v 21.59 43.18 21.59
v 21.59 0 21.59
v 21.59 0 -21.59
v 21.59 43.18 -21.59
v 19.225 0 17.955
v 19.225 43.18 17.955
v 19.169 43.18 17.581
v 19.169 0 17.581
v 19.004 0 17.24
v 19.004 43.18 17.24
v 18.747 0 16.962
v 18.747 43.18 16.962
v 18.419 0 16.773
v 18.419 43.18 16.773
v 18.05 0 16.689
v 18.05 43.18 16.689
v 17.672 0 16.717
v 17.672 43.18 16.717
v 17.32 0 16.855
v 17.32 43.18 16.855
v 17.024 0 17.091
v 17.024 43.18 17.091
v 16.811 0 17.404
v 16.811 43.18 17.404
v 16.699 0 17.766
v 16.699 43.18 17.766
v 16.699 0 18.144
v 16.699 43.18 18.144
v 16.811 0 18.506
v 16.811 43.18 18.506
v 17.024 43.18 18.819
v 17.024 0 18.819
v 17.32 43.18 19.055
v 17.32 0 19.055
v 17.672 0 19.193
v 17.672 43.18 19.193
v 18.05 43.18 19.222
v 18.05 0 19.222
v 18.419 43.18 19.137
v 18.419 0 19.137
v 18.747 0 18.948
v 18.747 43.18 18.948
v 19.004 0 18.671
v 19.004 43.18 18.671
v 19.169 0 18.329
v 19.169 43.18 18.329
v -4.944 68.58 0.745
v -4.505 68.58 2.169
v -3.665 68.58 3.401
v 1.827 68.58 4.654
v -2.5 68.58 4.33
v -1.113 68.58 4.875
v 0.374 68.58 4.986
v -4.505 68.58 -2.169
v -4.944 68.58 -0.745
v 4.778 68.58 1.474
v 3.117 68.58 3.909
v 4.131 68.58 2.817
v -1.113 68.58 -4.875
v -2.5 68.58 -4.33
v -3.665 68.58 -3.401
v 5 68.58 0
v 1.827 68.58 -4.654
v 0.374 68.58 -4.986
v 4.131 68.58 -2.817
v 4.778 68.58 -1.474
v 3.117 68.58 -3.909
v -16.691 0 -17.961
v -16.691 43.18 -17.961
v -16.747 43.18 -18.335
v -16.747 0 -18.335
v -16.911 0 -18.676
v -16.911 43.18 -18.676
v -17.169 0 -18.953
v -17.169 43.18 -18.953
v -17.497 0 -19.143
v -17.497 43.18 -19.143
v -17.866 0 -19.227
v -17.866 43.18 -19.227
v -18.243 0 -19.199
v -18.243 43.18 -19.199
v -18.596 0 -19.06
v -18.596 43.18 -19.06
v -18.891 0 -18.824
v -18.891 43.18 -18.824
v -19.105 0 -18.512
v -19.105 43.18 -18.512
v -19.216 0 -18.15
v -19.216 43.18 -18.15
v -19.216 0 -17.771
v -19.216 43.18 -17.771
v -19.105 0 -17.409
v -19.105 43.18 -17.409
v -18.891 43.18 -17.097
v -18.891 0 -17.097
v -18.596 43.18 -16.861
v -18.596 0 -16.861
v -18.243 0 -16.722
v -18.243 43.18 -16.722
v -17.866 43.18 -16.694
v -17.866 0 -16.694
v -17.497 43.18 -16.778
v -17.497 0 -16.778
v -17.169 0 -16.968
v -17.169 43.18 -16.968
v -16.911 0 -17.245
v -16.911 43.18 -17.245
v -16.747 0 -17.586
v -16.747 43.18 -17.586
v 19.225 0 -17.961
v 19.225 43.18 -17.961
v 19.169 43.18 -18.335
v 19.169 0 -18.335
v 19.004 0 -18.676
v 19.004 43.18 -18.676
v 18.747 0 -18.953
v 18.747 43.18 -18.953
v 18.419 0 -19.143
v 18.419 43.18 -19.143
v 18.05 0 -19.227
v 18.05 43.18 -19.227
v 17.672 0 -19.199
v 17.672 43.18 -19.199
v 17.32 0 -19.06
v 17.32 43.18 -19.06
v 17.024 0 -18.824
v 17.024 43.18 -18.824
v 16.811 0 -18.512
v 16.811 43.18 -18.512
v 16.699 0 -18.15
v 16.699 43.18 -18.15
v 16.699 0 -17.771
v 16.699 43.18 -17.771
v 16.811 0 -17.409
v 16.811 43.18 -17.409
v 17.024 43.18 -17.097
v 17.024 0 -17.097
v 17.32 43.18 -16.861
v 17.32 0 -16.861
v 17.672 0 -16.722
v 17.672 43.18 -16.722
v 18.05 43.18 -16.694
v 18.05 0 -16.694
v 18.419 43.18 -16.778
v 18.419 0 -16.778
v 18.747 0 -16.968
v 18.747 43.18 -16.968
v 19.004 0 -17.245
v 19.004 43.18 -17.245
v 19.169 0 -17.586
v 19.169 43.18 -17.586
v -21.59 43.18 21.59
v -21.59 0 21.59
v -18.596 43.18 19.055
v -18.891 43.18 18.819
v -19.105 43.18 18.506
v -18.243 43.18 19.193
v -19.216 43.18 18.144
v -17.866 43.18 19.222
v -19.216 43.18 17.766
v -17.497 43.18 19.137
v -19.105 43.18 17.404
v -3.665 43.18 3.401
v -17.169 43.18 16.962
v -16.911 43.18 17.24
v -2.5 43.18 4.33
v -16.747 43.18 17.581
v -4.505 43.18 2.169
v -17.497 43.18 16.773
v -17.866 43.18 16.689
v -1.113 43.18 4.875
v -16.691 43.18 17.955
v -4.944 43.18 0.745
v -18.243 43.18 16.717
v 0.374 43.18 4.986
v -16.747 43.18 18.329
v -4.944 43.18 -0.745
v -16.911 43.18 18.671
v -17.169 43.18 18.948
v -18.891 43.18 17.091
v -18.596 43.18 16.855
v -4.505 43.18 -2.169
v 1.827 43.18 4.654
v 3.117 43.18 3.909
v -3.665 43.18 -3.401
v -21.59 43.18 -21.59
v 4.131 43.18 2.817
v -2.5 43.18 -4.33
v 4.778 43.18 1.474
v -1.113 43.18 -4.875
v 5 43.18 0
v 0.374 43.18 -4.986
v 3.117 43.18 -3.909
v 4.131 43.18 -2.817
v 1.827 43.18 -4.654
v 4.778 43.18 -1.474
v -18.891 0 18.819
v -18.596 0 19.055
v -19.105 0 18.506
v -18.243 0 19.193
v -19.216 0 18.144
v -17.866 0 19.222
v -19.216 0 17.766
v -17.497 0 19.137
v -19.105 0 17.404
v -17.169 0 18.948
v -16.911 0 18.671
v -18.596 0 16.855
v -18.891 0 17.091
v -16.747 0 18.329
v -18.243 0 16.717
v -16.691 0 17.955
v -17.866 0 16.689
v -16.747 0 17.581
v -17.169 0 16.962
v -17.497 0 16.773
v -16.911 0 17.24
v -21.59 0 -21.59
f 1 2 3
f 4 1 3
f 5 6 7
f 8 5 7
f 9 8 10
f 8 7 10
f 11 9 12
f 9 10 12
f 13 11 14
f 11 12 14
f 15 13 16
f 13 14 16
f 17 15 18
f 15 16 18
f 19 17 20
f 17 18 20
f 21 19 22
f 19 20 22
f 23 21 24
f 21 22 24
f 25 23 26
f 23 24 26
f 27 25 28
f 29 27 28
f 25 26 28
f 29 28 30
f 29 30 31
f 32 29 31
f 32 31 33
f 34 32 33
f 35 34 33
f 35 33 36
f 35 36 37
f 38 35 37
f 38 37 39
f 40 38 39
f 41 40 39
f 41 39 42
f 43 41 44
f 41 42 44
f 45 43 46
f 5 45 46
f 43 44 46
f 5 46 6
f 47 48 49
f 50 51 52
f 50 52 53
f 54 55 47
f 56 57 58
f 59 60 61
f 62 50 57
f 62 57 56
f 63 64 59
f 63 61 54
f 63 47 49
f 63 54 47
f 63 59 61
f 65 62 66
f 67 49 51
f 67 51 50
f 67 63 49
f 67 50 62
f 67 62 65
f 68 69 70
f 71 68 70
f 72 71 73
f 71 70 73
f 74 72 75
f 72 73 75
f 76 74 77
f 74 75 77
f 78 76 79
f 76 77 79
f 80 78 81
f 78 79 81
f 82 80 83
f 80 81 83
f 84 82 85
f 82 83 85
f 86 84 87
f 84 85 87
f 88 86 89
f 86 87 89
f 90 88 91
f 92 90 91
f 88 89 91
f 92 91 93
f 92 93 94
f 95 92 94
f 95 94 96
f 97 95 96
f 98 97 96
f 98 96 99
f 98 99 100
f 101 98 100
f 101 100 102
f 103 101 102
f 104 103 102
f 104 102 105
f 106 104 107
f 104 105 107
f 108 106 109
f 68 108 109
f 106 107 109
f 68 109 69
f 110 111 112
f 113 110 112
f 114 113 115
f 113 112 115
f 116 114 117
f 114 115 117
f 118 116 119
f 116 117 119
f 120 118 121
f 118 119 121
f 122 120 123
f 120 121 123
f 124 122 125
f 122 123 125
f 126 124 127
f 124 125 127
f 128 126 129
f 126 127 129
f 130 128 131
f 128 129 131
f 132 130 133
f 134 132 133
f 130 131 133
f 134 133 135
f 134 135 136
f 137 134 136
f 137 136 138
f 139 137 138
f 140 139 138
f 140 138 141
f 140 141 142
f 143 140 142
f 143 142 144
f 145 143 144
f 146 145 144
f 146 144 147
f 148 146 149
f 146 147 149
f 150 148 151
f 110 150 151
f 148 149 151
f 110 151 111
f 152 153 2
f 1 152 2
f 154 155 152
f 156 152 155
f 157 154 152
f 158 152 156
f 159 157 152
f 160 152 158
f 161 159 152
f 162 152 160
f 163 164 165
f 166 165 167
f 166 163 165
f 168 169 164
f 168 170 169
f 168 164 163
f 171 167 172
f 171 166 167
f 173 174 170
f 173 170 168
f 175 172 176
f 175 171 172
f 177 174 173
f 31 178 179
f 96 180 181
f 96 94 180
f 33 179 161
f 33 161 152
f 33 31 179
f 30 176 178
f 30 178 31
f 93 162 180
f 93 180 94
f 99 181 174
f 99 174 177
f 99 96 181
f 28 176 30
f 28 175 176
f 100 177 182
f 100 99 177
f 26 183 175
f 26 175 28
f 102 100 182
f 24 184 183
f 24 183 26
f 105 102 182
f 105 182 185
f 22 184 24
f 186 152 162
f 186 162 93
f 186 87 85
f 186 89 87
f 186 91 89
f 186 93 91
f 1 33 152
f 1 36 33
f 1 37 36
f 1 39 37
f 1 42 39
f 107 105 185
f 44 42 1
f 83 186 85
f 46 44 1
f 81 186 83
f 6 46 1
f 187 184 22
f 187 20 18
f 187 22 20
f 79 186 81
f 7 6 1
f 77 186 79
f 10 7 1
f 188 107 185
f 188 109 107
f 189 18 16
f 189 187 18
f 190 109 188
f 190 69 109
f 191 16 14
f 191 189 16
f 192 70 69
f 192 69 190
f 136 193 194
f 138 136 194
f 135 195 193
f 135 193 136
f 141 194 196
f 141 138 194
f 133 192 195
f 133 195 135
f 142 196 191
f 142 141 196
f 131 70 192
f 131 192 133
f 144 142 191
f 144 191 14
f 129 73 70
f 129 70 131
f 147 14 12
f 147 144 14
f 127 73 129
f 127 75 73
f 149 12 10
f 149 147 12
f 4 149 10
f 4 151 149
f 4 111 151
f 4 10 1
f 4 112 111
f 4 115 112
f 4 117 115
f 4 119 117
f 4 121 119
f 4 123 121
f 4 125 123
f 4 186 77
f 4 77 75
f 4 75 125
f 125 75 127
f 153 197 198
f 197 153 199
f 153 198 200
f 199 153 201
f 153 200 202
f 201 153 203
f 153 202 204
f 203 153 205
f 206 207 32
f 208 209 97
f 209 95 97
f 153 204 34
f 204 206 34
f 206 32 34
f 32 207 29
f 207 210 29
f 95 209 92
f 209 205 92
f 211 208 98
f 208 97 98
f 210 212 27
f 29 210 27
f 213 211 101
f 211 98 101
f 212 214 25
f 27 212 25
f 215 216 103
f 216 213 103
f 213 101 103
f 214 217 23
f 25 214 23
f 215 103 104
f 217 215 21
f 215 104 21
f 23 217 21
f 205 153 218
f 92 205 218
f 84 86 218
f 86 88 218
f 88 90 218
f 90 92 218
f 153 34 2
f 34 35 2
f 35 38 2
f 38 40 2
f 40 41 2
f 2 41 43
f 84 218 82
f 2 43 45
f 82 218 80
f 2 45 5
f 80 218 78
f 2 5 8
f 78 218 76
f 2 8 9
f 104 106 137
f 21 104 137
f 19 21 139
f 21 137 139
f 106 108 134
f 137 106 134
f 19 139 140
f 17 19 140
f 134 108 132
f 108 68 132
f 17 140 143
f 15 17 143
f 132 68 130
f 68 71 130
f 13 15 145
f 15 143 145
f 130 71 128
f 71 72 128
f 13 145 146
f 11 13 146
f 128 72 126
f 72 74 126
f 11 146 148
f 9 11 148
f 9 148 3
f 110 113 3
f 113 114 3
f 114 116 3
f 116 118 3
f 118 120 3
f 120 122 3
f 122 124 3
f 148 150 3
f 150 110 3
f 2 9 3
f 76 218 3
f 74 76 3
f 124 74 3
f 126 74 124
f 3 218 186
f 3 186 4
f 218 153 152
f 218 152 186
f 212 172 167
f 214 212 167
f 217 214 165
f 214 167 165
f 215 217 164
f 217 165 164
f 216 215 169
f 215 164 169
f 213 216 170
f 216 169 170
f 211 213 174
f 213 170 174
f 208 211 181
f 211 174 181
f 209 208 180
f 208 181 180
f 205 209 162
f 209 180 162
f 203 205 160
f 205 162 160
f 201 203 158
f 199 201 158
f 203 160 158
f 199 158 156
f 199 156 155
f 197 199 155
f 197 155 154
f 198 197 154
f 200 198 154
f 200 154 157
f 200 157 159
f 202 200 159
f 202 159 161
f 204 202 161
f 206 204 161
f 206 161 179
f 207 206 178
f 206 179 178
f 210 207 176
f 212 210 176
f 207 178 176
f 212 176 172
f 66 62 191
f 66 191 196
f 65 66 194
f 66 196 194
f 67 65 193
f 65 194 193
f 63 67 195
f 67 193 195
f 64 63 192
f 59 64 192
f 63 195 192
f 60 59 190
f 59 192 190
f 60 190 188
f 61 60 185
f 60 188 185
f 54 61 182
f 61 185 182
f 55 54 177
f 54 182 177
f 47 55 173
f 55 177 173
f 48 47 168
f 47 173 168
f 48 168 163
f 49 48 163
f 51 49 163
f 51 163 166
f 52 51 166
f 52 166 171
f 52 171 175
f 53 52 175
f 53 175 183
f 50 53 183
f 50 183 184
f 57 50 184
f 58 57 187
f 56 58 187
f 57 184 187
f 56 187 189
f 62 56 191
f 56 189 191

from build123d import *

# Parameters (mm, degrees)
SKETCH1_W            = 43.18
SKETCH1_H            = 43.18
BOSS_EXTRUDE1_DEPTH  = 43.18
SKETCH2_R            = 5
BOSS_EXTRUDE2_DEPTH  = 25.4
SKETCH3_R            = 1.27
CUT_EXTRUDE1_DEPTH   = 43.18
LPATTERN1_COUNT      = 2
LPATTERN1_PITCH      = 35.9156
LPATTERN1_COUNT_DIR2 = 2
LPATTERN1_PITCH_DIR2 = 35.9156


with BuildPart() as part:
    # Sketch1 → Boss-Extrude1 (new body)
    with BuildSketch(Plane(origin=(0, 0, 0), x_dir=(1, 0, 0), z_dir=(0, 1, 0))):
        Rectangle(SKETCH1_W, SKETCH1_H)
    extrude(amount=BOSS_EXTRUDE1_DEPTH)

    # Sketch2 → Boss-Extrude2 (add)
    with BuildSketch(Plane(origin=(0, 43.18, 0), x_dir=(1, 0, 0), z_dir=(0, 1, 0))):
        Circle(SKETCH2_R)
    extrude(amount=BOSS_EXTRUDE2_DEPTH)

    # Sketch3 → Cut-Extrude1 (cut)
    with BuildSketch(Plane(origin=(0, 43.18, 0), x_dir=(1, 0, 0), z_dir=(0, 1, 0))):
        with Locations((-17.960512242, 17.960512242)):
            Circle(SKETCH3_R)
    cut_extrude1 = extrude(amount=-CUT_EXTRUDE1_DEPTH, mode=Mode.SUBTRACT)

    # LPattern1: Cut-Extrude1 2 × 2
    with Locations(*[(i * LPATTERN1_PITCH, 0, j * LPATTERN1_PITCH_DIR2) for i in range(LPATTERN1_COUNT) for j in range(LPATTERN1_COUNT_DIR2) if (i, j) != (0, 0)]):
        add(cut_extrude1, mode=Mode.SUBTRACT)


solid = part.part
